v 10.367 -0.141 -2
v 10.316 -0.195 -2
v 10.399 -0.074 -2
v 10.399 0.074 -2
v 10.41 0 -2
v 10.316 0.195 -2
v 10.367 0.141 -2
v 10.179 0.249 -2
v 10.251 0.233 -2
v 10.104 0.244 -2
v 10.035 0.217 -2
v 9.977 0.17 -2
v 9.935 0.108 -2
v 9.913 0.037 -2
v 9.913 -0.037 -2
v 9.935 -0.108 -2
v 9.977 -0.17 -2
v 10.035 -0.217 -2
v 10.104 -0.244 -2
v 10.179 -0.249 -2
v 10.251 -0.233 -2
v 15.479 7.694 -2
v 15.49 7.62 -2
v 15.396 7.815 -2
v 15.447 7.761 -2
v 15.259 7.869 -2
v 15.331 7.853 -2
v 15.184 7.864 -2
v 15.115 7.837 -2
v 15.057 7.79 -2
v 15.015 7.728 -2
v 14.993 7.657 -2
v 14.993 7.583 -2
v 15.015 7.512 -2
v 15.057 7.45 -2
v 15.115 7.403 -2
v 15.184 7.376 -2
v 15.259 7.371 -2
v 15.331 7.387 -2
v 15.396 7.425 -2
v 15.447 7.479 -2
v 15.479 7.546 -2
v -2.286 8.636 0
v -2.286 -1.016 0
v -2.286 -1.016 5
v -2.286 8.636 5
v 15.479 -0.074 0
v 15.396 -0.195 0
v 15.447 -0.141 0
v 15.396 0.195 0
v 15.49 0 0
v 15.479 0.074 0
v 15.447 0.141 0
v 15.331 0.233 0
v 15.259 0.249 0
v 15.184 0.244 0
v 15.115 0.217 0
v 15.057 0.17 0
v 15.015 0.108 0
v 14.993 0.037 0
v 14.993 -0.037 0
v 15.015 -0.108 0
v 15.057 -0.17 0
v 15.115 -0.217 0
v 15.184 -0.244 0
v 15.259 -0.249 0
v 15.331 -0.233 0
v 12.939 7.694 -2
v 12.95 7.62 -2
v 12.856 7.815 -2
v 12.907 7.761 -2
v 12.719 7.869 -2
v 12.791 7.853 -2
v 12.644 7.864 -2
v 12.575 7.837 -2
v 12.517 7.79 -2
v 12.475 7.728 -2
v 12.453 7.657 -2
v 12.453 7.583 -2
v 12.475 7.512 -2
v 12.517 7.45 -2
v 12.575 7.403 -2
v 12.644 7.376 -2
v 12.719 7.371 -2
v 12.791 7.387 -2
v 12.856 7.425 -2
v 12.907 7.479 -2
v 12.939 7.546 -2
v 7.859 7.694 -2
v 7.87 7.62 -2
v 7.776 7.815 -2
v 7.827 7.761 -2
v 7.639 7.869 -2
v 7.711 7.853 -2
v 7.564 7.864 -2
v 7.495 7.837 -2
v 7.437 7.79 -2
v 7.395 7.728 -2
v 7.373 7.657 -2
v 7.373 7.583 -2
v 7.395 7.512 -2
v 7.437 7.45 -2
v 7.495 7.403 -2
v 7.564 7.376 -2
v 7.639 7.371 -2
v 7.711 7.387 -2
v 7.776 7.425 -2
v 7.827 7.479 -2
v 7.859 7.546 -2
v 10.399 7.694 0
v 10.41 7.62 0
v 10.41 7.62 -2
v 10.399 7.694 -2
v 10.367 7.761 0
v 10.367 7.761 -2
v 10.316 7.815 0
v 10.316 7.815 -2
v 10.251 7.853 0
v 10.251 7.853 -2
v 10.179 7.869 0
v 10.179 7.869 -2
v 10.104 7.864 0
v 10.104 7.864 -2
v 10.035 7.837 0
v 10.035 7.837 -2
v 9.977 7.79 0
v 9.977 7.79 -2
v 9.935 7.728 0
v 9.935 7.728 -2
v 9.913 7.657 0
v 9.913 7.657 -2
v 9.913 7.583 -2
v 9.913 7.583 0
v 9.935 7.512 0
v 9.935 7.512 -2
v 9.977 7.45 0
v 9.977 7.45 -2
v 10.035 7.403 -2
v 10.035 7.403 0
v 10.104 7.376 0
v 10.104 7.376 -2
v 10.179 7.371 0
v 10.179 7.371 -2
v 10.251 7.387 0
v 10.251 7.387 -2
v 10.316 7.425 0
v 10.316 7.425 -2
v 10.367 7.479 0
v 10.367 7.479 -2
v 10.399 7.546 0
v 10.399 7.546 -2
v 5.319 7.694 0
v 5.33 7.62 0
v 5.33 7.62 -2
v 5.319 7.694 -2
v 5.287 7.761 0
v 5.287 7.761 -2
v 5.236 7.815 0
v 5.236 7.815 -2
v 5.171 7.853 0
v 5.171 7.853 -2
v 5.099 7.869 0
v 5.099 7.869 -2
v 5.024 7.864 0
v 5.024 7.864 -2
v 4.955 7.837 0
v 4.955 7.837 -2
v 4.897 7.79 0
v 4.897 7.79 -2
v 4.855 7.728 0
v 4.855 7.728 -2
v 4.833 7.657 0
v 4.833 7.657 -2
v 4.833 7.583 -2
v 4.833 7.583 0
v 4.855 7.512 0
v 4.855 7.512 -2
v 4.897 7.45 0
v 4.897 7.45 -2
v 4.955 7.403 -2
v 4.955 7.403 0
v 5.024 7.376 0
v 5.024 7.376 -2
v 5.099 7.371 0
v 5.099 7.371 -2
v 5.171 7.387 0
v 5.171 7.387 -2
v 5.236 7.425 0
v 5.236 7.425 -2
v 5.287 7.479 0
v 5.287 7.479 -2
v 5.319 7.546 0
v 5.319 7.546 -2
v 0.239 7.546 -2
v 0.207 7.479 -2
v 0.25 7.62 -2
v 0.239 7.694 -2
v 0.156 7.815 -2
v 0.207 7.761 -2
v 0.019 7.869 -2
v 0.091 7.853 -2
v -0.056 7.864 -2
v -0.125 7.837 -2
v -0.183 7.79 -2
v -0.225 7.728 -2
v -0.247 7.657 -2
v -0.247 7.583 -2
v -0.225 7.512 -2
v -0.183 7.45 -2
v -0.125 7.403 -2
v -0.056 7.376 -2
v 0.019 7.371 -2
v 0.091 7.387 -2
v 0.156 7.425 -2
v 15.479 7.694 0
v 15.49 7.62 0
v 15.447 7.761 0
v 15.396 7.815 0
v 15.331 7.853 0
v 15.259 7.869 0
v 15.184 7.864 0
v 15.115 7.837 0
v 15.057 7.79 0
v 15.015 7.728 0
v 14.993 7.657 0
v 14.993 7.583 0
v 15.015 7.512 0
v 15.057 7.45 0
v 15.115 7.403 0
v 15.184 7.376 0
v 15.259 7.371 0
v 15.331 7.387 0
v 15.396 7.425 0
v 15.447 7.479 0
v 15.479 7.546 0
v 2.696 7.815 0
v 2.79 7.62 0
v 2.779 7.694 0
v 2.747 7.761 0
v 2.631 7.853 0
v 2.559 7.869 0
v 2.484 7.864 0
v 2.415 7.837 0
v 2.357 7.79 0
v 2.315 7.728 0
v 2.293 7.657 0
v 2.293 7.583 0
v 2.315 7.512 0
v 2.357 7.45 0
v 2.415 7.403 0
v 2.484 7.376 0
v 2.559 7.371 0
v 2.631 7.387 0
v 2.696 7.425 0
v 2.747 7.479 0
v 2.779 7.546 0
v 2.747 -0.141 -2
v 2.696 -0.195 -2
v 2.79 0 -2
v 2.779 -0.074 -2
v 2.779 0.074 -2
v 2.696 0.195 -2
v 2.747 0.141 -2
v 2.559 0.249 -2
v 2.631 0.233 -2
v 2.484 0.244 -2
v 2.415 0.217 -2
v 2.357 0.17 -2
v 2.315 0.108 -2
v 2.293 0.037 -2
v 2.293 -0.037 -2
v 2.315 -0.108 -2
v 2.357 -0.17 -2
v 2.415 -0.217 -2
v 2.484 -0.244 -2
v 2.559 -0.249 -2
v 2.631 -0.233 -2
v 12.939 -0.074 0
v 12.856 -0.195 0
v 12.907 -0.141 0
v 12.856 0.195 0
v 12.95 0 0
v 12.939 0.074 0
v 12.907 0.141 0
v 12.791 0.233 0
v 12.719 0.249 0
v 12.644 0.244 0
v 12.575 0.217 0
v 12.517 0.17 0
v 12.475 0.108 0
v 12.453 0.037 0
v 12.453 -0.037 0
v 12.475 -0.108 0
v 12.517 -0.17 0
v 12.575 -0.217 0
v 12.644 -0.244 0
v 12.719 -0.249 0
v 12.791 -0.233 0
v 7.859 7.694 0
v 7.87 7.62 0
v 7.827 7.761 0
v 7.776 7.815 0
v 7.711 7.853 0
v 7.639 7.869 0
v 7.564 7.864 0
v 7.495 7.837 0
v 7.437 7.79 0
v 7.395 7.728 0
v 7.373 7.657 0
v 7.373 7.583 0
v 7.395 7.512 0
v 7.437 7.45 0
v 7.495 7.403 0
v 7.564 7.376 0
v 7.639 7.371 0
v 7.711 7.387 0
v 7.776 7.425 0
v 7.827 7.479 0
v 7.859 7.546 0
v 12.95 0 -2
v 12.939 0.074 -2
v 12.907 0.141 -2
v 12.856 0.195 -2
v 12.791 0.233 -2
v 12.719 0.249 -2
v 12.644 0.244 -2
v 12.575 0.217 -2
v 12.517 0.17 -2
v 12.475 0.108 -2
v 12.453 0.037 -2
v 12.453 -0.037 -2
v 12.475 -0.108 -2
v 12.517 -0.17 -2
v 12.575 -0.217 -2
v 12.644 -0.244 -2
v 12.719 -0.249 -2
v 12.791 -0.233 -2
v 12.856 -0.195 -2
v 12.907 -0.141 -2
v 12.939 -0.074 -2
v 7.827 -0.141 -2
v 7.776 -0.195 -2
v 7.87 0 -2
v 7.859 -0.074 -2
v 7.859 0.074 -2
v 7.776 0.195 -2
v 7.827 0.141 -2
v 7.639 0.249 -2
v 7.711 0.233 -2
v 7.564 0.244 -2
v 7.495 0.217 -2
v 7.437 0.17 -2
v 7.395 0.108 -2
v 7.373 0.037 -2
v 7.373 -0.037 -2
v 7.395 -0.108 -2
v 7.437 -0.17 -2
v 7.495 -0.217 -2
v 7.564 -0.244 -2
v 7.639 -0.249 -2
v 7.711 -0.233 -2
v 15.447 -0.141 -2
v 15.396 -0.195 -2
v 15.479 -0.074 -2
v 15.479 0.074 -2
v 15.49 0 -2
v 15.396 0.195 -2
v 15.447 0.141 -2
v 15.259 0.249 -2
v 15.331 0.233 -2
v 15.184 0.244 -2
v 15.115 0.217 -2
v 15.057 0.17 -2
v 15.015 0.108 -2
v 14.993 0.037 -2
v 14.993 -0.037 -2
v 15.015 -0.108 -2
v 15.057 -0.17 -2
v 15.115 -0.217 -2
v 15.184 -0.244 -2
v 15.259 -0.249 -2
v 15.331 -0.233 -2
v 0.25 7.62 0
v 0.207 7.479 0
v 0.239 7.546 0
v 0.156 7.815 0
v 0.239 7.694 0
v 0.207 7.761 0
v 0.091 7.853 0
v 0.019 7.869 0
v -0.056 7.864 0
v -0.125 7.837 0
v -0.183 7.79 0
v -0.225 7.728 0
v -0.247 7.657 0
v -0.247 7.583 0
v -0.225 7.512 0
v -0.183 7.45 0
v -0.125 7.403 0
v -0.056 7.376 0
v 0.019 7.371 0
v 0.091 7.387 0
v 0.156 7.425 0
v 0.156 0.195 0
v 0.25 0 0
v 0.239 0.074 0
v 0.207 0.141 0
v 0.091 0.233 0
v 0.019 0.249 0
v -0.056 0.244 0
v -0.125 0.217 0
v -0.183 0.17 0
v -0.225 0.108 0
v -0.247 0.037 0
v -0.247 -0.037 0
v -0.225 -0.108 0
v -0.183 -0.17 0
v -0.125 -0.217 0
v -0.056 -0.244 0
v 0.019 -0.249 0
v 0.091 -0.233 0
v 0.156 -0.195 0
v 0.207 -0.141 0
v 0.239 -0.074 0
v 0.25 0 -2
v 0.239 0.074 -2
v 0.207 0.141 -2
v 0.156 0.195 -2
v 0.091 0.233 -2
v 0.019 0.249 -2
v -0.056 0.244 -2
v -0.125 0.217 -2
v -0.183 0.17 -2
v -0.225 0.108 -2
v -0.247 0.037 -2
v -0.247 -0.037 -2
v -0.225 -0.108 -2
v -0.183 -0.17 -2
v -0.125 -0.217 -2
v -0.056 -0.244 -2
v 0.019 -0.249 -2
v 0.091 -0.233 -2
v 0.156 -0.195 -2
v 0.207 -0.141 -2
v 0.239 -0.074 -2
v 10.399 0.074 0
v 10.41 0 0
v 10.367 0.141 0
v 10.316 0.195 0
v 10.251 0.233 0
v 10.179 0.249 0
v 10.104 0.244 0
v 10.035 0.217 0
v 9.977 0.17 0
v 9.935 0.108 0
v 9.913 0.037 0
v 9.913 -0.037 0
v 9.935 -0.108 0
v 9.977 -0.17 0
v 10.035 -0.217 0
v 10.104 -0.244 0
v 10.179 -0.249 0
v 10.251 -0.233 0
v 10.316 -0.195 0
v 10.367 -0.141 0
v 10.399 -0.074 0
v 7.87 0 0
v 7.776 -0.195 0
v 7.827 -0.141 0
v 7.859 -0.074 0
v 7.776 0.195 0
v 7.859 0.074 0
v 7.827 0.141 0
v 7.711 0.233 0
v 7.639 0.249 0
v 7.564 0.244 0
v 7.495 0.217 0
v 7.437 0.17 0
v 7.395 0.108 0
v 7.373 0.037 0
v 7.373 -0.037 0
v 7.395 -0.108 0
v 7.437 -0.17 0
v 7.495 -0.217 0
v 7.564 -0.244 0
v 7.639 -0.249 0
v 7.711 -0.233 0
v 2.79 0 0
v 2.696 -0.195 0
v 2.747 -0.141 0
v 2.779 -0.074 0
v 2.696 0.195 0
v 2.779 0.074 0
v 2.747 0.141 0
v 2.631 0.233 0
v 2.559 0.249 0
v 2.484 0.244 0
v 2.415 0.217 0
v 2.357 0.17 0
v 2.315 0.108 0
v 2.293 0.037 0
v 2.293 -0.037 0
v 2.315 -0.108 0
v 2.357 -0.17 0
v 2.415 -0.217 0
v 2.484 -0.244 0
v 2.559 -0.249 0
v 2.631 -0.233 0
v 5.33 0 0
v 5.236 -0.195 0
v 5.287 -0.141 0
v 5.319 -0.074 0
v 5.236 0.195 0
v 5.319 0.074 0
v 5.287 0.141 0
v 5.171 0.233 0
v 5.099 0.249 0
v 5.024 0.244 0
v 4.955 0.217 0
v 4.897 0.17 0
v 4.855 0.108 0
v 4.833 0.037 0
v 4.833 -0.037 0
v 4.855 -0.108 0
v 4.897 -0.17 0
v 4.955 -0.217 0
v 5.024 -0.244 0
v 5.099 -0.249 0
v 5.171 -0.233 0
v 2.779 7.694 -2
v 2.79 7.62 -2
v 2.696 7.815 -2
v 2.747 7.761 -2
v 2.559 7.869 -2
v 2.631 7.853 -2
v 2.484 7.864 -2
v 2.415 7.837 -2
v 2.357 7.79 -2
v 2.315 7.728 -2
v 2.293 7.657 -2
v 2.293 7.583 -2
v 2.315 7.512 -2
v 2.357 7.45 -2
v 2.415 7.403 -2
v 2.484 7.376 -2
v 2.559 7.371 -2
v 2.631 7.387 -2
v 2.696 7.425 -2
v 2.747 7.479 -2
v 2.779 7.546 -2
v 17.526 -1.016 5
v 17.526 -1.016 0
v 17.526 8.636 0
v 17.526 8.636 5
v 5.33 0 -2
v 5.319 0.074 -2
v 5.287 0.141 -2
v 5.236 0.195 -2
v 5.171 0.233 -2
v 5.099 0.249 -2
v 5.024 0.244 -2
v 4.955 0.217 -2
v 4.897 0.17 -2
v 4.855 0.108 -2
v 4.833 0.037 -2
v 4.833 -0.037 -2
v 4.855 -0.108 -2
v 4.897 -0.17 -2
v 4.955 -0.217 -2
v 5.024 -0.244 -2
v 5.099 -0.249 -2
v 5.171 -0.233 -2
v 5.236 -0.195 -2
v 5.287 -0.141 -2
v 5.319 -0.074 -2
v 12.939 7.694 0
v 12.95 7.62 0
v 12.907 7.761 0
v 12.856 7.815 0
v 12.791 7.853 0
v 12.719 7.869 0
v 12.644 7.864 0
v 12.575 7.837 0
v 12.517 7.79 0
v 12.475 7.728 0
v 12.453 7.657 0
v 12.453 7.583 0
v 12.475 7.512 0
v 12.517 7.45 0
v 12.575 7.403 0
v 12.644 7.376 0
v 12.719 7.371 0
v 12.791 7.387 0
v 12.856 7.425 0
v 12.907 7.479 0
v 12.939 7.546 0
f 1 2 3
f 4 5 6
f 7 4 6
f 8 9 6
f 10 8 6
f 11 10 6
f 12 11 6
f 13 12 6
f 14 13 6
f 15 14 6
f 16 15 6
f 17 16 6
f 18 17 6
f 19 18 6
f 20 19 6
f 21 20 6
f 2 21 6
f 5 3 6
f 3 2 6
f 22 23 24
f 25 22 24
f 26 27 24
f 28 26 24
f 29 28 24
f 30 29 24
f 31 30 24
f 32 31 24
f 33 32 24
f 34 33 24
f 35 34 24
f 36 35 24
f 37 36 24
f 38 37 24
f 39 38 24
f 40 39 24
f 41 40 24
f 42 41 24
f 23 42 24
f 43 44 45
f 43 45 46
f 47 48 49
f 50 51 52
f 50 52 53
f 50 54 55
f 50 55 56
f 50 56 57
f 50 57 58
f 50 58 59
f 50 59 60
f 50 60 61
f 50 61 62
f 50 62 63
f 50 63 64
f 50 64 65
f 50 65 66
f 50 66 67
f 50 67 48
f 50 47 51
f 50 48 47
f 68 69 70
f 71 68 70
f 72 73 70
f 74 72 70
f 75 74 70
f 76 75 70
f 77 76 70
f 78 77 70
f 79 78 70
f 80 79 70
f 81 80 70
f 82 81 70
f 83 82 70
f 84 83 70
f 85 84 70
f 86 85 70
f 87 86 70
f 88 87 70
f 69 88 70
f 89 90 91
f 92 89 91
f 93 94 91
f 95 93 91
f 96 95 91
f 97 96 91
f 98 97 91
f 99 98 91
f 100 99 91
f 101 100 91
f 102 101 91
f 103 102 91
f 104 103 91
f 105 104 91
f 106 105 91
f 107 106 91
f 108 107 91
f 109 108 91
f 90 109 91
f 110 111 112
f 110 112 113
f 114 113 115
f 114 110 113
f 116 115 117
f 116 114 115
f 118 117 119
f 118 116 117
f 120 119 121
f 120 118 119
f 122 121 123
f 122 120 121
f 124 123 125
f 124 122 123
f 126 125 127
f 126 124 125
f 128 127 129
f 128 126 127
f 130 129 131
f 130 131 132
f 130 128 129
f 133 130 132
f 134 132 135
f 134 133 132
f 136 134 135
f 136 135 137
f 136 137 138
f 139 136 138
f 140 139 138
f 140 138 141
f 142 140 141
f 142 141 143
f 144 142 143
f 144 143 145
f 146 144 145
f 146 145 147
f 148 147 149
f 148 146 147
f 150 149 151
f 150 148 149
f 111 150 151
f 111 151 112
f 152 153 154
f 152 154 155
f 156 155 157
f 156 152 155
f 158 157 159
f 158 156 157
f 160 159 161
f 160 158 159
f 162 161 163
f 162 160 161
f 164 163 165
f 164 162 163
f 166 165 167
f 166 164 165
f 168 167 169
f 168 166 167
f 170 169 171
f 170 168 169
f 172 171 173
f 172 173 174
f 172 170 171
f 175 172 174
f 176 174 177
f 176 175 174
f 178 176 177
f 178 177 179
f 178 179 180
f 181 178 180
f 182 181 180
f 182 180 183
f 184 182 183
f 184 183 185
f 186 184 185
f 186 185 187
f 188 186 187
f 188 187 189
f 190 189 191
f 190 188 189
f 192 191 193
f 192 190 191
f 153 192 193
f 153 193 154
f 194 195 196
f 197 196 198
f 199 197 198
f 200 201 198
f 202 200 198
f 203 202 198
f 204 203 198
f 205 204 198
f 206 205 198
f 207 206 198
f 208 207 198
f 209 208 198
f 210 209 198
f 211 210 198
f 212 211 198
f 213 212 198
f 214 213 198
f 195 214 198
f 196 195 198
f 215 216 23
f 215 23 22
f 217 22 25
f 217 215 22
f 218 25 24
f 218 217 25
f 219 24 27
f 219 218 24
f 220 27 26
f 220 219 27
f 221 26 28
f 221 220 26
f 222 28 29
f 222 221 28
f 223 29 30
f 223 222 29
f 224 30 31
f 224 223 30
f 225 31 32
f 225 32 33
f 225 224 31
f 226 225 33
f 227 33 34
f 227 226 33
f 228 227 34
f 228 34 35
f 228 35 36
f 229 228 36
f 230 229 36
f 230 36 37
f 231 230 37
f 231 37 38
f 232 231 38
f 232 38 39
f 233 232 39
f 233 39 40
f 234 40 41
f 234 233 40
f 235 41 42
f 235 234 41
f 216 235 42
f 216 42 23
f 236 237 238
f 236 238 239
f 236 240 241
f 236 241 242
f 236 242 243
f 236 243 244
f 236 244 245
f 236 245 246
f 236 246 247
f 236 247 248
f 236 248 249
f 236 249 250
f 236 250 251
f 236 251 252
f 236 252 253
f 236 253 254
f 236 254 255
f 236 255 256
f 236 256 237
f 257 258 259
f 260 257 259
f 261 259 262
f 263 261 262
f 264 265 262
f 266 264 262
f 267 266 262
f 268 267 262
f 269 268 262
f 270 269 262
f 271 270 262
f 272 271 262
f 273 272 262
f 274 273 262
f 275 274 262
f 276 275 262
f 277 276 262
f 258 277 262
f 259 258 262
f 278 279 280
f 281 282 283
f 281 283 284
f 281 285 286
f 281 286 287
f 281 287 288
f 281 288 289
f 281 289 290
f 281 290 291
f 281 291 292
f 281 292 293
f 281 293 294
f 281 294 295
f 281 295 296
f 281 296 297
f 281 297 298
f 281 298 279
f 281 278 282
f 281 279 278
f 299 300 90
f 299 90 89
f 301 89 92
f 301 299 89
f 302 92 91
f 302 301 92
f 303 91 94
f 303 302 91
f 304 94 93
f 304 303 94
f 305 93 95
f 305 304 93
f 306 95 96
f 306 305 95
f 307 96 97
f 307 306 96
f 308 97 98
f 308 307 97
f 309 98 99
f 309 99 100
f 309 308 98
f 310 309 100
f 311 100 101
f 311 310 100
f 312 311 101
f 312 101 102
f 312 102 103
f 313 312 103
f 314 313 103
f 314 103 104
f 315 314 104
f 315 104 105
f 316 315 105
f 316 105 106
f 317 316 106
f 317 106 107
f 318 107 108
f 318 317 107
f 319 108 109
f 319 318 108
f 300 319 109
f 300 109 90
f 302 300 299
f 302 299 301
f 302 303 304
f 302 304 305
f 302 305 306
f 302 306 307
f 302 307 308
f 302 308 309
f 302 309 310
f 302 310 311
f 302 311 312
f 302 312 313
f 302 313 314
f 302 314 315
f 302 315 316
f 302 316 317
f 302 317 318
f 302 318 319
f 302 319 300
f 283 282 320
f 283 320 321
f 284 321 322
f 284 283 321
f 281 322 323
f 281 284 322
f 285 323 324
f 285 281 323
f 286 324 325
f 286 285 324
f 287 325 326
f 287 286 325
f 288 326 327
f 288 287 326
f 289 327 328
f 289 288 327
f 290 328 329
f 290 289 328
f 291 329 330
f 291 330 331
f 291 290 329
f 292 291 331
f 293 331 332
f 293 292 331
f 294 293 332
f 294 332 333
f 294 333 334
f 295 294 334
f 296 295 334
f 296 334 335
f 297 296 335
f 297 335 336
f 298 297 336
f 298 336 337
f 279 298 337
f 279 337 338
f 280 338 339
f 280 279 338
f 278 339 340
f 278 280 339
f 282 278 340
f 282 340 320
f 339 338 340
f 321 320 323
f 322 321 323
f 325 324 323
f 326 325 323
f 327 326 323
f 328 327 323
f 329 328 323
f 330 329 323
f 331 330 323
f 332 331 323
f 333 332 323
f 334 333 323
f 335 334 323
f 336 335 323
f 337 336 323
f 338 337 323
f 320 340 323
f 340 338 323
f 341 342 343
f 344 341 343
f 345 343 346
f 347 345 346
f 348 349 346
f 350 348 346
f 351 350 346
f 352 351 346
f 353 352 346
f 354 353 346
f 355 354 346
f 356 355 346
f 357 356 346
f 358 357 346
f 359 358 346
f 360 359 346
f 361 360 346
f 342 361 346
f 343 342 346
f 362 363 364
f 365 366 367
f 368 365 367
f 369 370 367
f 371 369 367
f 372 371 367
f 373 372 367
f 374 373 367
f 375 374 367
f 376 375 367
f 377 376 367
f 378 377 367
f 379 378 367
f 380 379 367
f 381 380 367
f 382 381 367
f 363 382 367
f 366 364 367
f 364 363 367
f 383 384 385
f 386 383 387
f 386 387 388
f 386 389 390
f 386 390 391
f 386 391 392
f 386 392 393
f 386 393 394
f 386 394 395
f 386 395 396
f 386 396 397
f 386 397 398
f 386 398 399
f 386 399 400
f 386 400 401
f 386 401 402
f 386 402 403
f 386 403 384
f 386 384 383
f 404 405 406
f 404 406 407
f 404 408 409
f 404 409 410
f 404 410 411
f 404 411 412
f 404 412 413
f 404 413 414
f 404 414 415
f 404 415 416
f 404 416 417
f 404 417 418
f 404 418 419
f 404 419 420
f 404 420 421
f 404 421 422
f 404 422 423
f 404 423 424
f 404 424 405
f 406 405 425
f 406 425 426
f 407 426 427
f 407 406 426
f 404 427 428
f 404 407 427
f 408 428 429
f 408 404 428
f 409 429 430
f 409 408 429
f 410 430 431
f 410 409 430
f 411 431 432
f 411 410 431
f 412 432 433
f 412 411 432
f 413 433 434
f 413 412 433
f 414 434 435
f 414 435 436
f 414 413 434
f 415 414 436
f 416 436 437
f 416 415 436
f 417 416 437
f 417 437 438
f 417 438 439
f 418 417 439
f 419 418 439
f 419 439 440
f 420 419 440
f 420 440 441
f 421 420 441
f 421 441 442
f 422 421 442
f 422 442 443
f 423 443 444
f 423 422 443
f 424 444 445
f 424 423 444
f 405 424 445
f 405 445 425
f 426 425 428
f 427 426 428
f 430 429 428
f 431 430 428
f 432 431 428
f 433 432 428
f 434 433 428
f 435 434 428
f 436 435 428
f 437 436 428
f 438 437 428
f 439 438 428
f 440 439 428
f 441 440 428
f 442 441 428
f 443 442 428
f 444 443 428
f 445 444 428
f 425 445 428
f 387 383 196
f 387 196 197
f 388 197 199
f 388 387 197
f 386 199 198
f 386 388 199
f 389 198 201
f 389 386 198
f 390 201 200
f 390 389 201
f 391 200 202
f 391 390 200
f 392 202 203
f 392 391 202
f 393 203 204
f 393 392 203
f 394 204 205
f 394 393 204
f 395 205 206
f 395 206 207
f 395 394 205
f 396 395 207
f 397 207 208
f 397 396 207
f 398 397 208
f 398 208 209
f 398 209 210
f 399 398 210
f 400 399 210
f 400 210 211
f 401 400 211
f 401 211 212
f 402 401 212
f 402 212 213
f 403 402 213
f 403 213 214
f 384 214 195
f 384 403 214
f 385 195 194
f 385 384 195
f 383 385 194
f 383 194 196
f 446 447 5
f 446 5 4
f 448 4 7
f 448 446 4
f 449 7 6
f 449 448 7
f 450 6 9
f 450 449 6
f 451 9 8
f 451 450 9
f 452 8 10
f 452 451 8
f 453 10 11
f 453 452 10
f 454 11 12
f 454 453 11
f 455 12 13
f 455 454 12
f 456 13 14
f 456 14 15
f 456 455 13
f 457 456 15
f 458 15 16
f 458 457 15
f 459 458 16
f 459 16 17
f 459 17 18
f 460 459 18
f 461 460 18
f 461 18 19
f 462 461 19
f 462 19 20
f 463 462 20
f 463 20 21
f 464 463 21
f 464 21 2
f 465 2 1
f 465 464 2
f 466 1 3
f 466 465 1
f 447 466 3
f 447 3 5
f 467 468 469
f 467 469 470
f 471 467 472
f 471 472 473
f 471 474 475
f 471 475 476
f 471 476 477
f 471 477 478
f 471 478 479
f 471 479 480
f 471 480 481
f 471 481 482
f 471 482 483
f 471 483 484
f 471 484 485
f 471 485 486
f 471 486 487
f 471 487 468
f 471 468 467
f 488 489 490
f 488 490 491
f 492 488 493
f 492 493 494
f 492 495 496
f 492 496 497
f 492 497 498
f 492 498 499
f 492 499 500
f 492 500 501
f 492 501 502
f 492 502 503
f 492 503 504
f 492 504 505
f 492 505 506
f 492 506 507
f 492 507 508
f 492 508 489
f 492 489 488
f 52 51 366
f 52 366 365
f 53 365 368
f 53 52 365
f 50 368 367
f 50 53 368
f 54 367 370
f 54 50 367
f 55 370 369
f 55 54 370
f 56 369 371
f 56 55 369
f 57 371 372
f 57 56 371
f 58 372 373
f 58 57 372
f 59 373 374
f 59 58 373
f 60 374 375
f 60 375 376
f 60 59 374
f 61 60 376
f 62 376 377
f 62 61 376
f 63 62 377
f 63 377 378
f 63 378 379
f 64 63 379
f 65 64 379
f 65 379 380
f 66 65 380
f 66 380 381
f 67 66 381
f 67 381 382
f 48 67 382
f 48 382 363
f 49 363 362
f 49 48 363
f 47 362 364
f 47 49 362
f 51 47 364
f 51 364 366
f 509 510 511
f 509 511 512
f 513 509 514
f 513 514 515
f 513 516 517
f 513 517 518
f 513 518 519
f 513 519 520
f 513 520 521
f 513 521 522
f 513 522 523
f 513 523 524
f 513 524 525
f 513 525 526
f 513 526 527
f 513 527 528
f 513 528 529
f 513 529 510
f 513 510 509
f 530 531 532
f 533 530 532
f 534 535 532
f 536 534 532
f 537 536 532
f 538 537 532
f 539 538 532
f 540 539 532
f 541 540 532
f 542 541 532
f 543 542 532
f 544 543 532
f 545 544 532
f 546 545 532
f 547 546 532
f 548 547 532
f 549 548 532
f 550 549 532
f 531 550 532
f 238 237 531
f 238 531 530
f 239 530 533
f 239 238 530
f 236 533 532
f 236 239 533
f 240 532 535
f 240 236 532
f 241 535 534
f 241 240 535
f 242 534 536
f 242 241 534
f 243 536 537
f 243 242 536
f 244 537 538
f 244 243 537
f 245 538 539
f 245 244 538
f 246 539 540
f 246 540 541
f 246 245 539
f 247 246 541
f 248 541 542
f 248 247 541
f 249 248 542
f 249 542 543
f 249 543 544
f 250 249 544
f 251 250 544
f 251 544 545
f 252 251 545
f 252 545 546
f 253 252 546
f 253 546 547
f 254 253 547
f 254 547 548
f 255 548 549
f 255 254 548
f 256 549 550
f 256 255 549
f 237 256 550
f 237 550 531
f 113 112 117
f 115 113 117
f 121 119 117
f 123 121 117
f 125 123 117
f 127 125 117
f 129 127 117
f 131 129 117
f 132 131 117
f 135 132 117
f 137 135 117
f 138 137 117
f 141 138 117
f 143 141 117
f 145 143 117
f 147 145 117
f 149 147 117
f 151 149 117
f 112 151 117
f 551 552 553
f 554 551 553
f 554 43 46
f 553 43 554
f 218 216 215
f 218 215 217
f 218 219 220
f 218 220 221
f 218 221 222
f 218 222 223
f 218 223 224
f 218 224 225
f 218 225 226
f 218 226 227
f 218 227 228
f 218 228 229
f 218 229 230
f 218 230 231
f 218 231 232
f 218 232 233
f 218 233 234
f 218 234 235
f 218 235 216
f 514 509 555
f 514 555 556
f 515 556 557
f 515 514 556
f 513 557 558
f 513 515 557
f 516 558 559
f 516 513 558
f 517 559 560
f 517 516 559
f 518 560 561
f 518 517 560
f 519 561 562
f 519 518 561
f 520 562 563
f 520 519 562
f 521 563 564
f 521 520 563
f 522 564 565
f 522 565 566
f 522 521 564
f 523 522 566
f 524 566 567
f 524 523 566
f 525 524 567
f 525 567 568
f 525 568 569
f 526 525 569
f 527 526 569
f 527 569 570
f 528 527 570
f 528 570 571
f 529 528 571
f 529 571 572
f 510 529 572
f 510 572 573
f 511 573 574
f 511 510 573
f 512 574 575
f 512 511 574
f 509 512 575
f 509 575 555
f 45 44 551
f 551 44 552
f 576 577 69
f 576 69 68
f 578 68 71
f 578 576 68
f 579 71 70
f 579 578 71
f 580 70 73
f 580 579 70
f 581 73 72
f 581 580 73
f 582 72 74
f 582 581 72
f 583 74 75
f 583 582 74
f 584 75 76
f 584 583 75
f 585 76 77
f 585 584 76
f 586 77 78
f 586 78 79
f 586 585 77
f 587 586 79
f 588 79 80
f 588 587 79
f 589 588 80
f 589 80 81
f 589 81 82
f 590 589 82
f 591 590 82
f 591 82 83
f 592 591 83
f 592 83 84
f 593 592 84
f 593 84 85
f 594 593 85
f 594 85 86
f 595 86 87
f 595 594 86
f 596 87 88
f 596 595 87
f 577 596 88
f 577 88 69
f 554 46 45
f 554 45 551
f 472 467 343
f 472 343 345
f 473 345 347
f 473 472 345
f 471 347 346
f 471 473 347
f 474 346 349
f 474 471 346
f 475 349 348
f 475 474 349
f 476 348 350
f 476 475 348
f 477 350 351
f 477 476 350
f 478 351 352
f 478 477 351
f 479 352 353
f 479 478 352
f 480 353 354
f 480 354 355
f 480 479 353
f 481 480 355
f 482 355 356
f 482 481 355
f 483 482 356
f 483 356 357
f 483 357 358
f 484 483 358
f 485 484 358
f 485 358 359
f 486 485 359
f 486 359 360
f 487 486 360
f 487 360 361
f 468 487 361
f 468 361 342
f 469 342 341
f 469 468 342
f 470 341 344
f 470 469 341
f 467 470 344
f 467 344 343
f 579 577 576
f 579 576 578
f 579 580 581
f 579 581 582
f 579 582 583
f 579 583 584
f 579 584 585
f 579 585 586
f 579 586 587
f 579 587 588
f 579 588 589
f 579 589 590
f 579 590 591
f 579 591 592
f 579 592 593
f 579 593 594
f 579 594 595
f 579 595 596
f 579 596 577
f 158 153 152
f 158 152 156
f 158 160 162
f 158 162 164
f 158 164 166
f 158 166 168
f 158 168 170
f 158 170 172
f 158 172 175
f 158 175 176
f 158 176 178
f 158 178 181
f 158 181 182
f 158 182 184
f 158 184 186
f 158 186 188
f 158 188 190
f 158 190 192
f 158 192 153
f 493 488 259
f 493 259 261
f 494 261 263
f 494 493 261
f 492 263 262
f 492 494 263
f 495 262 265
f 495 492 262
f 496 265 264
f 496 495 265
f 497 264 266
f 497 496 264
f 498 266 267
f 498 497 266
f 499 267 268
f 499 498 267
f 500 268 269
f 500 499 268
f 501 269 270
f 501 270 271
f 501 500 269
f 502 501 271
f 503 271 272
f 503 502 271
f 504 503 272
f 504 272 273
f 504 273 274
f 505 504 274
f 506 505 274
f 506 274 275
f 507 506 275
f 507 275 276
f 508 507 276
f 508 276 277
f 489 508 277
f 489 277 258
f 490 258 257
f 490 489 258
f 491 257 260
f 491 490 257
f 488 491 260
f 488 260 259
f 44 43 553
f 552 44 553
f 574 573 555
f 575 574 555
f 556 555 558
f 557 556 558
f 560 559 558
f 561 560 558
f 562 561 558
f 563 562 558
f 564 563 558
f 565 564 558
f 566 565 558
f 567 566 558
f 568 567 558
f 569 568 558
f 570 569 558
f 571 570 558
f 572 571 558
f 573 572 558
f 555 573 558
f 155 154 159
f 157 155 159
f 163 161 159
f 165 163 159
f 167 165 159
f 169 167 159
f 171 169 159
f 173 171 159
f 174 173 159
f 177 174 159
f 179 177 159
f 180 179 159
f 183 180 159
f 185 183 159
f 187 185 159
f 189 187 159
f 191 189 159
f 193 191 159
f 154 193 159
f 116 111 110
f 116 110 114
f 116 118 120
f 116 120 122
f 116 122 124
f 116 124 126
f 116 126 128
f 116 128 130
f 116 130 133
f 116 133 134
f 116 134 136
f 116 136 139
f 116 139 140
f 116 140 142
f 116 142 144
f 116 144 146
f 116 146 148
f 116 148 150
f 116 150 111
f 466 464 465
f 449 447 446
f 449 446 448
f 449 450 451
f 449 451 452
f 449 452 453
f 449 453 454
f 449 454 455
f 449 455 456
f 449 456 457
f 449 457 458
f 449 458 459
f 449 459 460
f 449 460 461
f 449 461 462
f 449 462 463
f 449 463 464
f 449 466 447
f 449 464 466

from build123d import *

# Parameters (mm, degrees)
SKETCH1_W               = 19.812
SKETCH1_H               = 9.652
COMPONENT_OUTLINE_DEPTH = 5
SKETCH2_R               = 0.25
EXTRUDE_1_DEPTH         = 2
SKETCH3_R               = 0.25
EXTRUDE_2_DEPTH         = 2
SKETCH4_R               = 0.25
EXTRUDE_3_DEPTH         = 2
SKETCH5_R               = 0.25
EXTRUDE_4_DEPTH         = 2
SKETCH6_R               = 0.25
EXTRUDE_5_DEPTH         = 2
SKETCH7_R               = 0.25
EXTRUDE_6_DEPTH         = 2
SKETCH8_R               = 0.25
EXTRUDE_7_DEPTH         = 2
SKETCH9_R               = 0.25
EXTRUDE_8_DEPTH         = 2
SKETCH10_R              = 0.25
EXTRUDE_9_DEPTH         = 2
SKETCH11_R              = 0.25
EXTRUDE_10_DEPTH        = 2
SKETCH12_R              = 0.25
EXTRUDE_11_DEPTH        = 2
SKETCH13_R              = 0.25
EXTRUDE_12_DEPTH        = 2
SKETCH14_R              = 0.25
EXTRUDE_13_DEPTH        = 2
SKETCH15_R              = 0.25
EXTRUDE_14_DEPTH        = 2


with BuildPart() as part:
    # Sketch1 → Component_Outline (new body)
    with BuildSketch(Plane.XY):
        with Locations((7.62, 3.81)):
            Rectangle(SKETCH1_W, SKETCH1_H)
    extrude(amount=COMPONENT_OUTLINE_DEPTH)


with BuildPart() as body_2:
    # Sketch2 → Extrude 1 (new body)
    with BuildSketch(Plane.XY):
        Circle(SKETCH2_R)
    extrude(amount=-EXTRUDE_1_DEPTH)


with BuildPart() as body_3:
    # Sketch3 → Extrude 2 (new body)
    with BuildSketch(Plane.XY):
        with Locations((2.54, 0)):
            Circle(SKETCH3_R)
    extrude(amount=-EXTRUDE_2_DEPTH)


with BuildPart() as body_4:
    # Sketch4 → Extrude 3 (new body)
    with BuildSketch(Plane.XY):
        with Locations((5.08, 0)):
            Circle(SKETCH4_R)
    extrude(amount=-EXTRUDE_3_DEPTH)


with BuildPart() as body_5:
    # Sketch5 → Extrude 4 (new body)
    with BuildSketch(Plane.XY):
        with Locations((7.62, 0)):
            Circle(SKETCH5_R)
    extrude(amount=-EXTRUDE_4_DEPTH)


with BuildPart() as body_6:
    # Sketch6 → Extrude 5 (new body)
    with BuildSketch(Plane.XY):
        with Locations((10.16, 0)):
            Circle(SKETCH6_R)
    extrude(amount=-EXTRUDE_5_DEPTH)


with BuildPart() as body_7:
    # Sketch7 → Extrude 6 (new body)
    with BuildSketch(Plane.XY):
        with Locations((12.7, 0)):
            Circle(SKETCH7_R)
    extrude(amount=-EXTRUDE_6_DEPTH)


with BuildPart() as body_8:
    # Sketch8 → Extrude 7 (new body)
    with BuildSketch(Plane.XY):
        with Locations((15.24, 0)):
            Circle(SKETCH8_R)
    extrude(amount=-EXTRUDE_7_DEPTH)


with BuildPart() as body_9:
    # Sketch9 → Extrude 8 (new body)
    with BuildSketch(Plane.XY):
        with Locations((15.24, 7.62)):
            Circle(SKETCH9_R)
    extrude(amount=-EXTRUDE_8_DEPTH)


with BuildPart() as body_10:
    # Sketch10 → Extrude 9 (new body)
    with BuildSketch(Plane.XY):
        with Locations((12.7, 7.62)):
            Circle(SKETCH10_R)
    extrude(amount=-EXTRUDE_9_DEPTH)


with BuildPart() as body_11:
    # Sketch11 → Extrude 10 (new body)
    with BuildSketch(Plane.XY):
        with Locations((10.16, 7.62)):
            Circle(SKETCH11_R)
    extrude(amount=-EXTRUDE_10_DEPTH)


with BuildPart() as body_12:
    # Sketch12 → Extrude 11 (new body)
    with BuildSketch(Plane.XY):
        with Locations((7.62, 7.62)):
            Circle(SKETCH12_R)
    extrude(amount=-EXTRUDE_11_DEPTH)


with BuildPart() as body_13:
    # Sketch13 → Extrude 12 (new body)
    with BuildSketch(Plane.XY):
        with Locations((5.08, 7.62)):
            Circle(SKETCH13_R)
    extrude(amount=-EXTRUDE_12_DEPTH)


with BuildPart() as body_14:
    # Sketch14 → Extrude 13 (new body)
    with BuildSketch(Plane.XY):
        with Locations((2.54, 7.62)):
            Circle(SKETCH14_R)
    extrude(amount=-EXTRUDE_13_DEPTH)


with BuildPart() as body_15:
    # Sketch15 → Extrude 14 (new body)
    with BuildSketch(Plane.XY):
        with Locations((0, 7.62)):
            Circle(SKETCH15_R)
    extrude(amount=-EXTRUDE_14_DEPTH)


solid = Compound([part.part, body_2.part, body_3.part, body_4.part, body_5.part, body_6.part, body_7.part, body_8.part, body_9.part, body_10.part, body_11.part, body_12.part, body_13.part, body_14.part, body_15.part])
